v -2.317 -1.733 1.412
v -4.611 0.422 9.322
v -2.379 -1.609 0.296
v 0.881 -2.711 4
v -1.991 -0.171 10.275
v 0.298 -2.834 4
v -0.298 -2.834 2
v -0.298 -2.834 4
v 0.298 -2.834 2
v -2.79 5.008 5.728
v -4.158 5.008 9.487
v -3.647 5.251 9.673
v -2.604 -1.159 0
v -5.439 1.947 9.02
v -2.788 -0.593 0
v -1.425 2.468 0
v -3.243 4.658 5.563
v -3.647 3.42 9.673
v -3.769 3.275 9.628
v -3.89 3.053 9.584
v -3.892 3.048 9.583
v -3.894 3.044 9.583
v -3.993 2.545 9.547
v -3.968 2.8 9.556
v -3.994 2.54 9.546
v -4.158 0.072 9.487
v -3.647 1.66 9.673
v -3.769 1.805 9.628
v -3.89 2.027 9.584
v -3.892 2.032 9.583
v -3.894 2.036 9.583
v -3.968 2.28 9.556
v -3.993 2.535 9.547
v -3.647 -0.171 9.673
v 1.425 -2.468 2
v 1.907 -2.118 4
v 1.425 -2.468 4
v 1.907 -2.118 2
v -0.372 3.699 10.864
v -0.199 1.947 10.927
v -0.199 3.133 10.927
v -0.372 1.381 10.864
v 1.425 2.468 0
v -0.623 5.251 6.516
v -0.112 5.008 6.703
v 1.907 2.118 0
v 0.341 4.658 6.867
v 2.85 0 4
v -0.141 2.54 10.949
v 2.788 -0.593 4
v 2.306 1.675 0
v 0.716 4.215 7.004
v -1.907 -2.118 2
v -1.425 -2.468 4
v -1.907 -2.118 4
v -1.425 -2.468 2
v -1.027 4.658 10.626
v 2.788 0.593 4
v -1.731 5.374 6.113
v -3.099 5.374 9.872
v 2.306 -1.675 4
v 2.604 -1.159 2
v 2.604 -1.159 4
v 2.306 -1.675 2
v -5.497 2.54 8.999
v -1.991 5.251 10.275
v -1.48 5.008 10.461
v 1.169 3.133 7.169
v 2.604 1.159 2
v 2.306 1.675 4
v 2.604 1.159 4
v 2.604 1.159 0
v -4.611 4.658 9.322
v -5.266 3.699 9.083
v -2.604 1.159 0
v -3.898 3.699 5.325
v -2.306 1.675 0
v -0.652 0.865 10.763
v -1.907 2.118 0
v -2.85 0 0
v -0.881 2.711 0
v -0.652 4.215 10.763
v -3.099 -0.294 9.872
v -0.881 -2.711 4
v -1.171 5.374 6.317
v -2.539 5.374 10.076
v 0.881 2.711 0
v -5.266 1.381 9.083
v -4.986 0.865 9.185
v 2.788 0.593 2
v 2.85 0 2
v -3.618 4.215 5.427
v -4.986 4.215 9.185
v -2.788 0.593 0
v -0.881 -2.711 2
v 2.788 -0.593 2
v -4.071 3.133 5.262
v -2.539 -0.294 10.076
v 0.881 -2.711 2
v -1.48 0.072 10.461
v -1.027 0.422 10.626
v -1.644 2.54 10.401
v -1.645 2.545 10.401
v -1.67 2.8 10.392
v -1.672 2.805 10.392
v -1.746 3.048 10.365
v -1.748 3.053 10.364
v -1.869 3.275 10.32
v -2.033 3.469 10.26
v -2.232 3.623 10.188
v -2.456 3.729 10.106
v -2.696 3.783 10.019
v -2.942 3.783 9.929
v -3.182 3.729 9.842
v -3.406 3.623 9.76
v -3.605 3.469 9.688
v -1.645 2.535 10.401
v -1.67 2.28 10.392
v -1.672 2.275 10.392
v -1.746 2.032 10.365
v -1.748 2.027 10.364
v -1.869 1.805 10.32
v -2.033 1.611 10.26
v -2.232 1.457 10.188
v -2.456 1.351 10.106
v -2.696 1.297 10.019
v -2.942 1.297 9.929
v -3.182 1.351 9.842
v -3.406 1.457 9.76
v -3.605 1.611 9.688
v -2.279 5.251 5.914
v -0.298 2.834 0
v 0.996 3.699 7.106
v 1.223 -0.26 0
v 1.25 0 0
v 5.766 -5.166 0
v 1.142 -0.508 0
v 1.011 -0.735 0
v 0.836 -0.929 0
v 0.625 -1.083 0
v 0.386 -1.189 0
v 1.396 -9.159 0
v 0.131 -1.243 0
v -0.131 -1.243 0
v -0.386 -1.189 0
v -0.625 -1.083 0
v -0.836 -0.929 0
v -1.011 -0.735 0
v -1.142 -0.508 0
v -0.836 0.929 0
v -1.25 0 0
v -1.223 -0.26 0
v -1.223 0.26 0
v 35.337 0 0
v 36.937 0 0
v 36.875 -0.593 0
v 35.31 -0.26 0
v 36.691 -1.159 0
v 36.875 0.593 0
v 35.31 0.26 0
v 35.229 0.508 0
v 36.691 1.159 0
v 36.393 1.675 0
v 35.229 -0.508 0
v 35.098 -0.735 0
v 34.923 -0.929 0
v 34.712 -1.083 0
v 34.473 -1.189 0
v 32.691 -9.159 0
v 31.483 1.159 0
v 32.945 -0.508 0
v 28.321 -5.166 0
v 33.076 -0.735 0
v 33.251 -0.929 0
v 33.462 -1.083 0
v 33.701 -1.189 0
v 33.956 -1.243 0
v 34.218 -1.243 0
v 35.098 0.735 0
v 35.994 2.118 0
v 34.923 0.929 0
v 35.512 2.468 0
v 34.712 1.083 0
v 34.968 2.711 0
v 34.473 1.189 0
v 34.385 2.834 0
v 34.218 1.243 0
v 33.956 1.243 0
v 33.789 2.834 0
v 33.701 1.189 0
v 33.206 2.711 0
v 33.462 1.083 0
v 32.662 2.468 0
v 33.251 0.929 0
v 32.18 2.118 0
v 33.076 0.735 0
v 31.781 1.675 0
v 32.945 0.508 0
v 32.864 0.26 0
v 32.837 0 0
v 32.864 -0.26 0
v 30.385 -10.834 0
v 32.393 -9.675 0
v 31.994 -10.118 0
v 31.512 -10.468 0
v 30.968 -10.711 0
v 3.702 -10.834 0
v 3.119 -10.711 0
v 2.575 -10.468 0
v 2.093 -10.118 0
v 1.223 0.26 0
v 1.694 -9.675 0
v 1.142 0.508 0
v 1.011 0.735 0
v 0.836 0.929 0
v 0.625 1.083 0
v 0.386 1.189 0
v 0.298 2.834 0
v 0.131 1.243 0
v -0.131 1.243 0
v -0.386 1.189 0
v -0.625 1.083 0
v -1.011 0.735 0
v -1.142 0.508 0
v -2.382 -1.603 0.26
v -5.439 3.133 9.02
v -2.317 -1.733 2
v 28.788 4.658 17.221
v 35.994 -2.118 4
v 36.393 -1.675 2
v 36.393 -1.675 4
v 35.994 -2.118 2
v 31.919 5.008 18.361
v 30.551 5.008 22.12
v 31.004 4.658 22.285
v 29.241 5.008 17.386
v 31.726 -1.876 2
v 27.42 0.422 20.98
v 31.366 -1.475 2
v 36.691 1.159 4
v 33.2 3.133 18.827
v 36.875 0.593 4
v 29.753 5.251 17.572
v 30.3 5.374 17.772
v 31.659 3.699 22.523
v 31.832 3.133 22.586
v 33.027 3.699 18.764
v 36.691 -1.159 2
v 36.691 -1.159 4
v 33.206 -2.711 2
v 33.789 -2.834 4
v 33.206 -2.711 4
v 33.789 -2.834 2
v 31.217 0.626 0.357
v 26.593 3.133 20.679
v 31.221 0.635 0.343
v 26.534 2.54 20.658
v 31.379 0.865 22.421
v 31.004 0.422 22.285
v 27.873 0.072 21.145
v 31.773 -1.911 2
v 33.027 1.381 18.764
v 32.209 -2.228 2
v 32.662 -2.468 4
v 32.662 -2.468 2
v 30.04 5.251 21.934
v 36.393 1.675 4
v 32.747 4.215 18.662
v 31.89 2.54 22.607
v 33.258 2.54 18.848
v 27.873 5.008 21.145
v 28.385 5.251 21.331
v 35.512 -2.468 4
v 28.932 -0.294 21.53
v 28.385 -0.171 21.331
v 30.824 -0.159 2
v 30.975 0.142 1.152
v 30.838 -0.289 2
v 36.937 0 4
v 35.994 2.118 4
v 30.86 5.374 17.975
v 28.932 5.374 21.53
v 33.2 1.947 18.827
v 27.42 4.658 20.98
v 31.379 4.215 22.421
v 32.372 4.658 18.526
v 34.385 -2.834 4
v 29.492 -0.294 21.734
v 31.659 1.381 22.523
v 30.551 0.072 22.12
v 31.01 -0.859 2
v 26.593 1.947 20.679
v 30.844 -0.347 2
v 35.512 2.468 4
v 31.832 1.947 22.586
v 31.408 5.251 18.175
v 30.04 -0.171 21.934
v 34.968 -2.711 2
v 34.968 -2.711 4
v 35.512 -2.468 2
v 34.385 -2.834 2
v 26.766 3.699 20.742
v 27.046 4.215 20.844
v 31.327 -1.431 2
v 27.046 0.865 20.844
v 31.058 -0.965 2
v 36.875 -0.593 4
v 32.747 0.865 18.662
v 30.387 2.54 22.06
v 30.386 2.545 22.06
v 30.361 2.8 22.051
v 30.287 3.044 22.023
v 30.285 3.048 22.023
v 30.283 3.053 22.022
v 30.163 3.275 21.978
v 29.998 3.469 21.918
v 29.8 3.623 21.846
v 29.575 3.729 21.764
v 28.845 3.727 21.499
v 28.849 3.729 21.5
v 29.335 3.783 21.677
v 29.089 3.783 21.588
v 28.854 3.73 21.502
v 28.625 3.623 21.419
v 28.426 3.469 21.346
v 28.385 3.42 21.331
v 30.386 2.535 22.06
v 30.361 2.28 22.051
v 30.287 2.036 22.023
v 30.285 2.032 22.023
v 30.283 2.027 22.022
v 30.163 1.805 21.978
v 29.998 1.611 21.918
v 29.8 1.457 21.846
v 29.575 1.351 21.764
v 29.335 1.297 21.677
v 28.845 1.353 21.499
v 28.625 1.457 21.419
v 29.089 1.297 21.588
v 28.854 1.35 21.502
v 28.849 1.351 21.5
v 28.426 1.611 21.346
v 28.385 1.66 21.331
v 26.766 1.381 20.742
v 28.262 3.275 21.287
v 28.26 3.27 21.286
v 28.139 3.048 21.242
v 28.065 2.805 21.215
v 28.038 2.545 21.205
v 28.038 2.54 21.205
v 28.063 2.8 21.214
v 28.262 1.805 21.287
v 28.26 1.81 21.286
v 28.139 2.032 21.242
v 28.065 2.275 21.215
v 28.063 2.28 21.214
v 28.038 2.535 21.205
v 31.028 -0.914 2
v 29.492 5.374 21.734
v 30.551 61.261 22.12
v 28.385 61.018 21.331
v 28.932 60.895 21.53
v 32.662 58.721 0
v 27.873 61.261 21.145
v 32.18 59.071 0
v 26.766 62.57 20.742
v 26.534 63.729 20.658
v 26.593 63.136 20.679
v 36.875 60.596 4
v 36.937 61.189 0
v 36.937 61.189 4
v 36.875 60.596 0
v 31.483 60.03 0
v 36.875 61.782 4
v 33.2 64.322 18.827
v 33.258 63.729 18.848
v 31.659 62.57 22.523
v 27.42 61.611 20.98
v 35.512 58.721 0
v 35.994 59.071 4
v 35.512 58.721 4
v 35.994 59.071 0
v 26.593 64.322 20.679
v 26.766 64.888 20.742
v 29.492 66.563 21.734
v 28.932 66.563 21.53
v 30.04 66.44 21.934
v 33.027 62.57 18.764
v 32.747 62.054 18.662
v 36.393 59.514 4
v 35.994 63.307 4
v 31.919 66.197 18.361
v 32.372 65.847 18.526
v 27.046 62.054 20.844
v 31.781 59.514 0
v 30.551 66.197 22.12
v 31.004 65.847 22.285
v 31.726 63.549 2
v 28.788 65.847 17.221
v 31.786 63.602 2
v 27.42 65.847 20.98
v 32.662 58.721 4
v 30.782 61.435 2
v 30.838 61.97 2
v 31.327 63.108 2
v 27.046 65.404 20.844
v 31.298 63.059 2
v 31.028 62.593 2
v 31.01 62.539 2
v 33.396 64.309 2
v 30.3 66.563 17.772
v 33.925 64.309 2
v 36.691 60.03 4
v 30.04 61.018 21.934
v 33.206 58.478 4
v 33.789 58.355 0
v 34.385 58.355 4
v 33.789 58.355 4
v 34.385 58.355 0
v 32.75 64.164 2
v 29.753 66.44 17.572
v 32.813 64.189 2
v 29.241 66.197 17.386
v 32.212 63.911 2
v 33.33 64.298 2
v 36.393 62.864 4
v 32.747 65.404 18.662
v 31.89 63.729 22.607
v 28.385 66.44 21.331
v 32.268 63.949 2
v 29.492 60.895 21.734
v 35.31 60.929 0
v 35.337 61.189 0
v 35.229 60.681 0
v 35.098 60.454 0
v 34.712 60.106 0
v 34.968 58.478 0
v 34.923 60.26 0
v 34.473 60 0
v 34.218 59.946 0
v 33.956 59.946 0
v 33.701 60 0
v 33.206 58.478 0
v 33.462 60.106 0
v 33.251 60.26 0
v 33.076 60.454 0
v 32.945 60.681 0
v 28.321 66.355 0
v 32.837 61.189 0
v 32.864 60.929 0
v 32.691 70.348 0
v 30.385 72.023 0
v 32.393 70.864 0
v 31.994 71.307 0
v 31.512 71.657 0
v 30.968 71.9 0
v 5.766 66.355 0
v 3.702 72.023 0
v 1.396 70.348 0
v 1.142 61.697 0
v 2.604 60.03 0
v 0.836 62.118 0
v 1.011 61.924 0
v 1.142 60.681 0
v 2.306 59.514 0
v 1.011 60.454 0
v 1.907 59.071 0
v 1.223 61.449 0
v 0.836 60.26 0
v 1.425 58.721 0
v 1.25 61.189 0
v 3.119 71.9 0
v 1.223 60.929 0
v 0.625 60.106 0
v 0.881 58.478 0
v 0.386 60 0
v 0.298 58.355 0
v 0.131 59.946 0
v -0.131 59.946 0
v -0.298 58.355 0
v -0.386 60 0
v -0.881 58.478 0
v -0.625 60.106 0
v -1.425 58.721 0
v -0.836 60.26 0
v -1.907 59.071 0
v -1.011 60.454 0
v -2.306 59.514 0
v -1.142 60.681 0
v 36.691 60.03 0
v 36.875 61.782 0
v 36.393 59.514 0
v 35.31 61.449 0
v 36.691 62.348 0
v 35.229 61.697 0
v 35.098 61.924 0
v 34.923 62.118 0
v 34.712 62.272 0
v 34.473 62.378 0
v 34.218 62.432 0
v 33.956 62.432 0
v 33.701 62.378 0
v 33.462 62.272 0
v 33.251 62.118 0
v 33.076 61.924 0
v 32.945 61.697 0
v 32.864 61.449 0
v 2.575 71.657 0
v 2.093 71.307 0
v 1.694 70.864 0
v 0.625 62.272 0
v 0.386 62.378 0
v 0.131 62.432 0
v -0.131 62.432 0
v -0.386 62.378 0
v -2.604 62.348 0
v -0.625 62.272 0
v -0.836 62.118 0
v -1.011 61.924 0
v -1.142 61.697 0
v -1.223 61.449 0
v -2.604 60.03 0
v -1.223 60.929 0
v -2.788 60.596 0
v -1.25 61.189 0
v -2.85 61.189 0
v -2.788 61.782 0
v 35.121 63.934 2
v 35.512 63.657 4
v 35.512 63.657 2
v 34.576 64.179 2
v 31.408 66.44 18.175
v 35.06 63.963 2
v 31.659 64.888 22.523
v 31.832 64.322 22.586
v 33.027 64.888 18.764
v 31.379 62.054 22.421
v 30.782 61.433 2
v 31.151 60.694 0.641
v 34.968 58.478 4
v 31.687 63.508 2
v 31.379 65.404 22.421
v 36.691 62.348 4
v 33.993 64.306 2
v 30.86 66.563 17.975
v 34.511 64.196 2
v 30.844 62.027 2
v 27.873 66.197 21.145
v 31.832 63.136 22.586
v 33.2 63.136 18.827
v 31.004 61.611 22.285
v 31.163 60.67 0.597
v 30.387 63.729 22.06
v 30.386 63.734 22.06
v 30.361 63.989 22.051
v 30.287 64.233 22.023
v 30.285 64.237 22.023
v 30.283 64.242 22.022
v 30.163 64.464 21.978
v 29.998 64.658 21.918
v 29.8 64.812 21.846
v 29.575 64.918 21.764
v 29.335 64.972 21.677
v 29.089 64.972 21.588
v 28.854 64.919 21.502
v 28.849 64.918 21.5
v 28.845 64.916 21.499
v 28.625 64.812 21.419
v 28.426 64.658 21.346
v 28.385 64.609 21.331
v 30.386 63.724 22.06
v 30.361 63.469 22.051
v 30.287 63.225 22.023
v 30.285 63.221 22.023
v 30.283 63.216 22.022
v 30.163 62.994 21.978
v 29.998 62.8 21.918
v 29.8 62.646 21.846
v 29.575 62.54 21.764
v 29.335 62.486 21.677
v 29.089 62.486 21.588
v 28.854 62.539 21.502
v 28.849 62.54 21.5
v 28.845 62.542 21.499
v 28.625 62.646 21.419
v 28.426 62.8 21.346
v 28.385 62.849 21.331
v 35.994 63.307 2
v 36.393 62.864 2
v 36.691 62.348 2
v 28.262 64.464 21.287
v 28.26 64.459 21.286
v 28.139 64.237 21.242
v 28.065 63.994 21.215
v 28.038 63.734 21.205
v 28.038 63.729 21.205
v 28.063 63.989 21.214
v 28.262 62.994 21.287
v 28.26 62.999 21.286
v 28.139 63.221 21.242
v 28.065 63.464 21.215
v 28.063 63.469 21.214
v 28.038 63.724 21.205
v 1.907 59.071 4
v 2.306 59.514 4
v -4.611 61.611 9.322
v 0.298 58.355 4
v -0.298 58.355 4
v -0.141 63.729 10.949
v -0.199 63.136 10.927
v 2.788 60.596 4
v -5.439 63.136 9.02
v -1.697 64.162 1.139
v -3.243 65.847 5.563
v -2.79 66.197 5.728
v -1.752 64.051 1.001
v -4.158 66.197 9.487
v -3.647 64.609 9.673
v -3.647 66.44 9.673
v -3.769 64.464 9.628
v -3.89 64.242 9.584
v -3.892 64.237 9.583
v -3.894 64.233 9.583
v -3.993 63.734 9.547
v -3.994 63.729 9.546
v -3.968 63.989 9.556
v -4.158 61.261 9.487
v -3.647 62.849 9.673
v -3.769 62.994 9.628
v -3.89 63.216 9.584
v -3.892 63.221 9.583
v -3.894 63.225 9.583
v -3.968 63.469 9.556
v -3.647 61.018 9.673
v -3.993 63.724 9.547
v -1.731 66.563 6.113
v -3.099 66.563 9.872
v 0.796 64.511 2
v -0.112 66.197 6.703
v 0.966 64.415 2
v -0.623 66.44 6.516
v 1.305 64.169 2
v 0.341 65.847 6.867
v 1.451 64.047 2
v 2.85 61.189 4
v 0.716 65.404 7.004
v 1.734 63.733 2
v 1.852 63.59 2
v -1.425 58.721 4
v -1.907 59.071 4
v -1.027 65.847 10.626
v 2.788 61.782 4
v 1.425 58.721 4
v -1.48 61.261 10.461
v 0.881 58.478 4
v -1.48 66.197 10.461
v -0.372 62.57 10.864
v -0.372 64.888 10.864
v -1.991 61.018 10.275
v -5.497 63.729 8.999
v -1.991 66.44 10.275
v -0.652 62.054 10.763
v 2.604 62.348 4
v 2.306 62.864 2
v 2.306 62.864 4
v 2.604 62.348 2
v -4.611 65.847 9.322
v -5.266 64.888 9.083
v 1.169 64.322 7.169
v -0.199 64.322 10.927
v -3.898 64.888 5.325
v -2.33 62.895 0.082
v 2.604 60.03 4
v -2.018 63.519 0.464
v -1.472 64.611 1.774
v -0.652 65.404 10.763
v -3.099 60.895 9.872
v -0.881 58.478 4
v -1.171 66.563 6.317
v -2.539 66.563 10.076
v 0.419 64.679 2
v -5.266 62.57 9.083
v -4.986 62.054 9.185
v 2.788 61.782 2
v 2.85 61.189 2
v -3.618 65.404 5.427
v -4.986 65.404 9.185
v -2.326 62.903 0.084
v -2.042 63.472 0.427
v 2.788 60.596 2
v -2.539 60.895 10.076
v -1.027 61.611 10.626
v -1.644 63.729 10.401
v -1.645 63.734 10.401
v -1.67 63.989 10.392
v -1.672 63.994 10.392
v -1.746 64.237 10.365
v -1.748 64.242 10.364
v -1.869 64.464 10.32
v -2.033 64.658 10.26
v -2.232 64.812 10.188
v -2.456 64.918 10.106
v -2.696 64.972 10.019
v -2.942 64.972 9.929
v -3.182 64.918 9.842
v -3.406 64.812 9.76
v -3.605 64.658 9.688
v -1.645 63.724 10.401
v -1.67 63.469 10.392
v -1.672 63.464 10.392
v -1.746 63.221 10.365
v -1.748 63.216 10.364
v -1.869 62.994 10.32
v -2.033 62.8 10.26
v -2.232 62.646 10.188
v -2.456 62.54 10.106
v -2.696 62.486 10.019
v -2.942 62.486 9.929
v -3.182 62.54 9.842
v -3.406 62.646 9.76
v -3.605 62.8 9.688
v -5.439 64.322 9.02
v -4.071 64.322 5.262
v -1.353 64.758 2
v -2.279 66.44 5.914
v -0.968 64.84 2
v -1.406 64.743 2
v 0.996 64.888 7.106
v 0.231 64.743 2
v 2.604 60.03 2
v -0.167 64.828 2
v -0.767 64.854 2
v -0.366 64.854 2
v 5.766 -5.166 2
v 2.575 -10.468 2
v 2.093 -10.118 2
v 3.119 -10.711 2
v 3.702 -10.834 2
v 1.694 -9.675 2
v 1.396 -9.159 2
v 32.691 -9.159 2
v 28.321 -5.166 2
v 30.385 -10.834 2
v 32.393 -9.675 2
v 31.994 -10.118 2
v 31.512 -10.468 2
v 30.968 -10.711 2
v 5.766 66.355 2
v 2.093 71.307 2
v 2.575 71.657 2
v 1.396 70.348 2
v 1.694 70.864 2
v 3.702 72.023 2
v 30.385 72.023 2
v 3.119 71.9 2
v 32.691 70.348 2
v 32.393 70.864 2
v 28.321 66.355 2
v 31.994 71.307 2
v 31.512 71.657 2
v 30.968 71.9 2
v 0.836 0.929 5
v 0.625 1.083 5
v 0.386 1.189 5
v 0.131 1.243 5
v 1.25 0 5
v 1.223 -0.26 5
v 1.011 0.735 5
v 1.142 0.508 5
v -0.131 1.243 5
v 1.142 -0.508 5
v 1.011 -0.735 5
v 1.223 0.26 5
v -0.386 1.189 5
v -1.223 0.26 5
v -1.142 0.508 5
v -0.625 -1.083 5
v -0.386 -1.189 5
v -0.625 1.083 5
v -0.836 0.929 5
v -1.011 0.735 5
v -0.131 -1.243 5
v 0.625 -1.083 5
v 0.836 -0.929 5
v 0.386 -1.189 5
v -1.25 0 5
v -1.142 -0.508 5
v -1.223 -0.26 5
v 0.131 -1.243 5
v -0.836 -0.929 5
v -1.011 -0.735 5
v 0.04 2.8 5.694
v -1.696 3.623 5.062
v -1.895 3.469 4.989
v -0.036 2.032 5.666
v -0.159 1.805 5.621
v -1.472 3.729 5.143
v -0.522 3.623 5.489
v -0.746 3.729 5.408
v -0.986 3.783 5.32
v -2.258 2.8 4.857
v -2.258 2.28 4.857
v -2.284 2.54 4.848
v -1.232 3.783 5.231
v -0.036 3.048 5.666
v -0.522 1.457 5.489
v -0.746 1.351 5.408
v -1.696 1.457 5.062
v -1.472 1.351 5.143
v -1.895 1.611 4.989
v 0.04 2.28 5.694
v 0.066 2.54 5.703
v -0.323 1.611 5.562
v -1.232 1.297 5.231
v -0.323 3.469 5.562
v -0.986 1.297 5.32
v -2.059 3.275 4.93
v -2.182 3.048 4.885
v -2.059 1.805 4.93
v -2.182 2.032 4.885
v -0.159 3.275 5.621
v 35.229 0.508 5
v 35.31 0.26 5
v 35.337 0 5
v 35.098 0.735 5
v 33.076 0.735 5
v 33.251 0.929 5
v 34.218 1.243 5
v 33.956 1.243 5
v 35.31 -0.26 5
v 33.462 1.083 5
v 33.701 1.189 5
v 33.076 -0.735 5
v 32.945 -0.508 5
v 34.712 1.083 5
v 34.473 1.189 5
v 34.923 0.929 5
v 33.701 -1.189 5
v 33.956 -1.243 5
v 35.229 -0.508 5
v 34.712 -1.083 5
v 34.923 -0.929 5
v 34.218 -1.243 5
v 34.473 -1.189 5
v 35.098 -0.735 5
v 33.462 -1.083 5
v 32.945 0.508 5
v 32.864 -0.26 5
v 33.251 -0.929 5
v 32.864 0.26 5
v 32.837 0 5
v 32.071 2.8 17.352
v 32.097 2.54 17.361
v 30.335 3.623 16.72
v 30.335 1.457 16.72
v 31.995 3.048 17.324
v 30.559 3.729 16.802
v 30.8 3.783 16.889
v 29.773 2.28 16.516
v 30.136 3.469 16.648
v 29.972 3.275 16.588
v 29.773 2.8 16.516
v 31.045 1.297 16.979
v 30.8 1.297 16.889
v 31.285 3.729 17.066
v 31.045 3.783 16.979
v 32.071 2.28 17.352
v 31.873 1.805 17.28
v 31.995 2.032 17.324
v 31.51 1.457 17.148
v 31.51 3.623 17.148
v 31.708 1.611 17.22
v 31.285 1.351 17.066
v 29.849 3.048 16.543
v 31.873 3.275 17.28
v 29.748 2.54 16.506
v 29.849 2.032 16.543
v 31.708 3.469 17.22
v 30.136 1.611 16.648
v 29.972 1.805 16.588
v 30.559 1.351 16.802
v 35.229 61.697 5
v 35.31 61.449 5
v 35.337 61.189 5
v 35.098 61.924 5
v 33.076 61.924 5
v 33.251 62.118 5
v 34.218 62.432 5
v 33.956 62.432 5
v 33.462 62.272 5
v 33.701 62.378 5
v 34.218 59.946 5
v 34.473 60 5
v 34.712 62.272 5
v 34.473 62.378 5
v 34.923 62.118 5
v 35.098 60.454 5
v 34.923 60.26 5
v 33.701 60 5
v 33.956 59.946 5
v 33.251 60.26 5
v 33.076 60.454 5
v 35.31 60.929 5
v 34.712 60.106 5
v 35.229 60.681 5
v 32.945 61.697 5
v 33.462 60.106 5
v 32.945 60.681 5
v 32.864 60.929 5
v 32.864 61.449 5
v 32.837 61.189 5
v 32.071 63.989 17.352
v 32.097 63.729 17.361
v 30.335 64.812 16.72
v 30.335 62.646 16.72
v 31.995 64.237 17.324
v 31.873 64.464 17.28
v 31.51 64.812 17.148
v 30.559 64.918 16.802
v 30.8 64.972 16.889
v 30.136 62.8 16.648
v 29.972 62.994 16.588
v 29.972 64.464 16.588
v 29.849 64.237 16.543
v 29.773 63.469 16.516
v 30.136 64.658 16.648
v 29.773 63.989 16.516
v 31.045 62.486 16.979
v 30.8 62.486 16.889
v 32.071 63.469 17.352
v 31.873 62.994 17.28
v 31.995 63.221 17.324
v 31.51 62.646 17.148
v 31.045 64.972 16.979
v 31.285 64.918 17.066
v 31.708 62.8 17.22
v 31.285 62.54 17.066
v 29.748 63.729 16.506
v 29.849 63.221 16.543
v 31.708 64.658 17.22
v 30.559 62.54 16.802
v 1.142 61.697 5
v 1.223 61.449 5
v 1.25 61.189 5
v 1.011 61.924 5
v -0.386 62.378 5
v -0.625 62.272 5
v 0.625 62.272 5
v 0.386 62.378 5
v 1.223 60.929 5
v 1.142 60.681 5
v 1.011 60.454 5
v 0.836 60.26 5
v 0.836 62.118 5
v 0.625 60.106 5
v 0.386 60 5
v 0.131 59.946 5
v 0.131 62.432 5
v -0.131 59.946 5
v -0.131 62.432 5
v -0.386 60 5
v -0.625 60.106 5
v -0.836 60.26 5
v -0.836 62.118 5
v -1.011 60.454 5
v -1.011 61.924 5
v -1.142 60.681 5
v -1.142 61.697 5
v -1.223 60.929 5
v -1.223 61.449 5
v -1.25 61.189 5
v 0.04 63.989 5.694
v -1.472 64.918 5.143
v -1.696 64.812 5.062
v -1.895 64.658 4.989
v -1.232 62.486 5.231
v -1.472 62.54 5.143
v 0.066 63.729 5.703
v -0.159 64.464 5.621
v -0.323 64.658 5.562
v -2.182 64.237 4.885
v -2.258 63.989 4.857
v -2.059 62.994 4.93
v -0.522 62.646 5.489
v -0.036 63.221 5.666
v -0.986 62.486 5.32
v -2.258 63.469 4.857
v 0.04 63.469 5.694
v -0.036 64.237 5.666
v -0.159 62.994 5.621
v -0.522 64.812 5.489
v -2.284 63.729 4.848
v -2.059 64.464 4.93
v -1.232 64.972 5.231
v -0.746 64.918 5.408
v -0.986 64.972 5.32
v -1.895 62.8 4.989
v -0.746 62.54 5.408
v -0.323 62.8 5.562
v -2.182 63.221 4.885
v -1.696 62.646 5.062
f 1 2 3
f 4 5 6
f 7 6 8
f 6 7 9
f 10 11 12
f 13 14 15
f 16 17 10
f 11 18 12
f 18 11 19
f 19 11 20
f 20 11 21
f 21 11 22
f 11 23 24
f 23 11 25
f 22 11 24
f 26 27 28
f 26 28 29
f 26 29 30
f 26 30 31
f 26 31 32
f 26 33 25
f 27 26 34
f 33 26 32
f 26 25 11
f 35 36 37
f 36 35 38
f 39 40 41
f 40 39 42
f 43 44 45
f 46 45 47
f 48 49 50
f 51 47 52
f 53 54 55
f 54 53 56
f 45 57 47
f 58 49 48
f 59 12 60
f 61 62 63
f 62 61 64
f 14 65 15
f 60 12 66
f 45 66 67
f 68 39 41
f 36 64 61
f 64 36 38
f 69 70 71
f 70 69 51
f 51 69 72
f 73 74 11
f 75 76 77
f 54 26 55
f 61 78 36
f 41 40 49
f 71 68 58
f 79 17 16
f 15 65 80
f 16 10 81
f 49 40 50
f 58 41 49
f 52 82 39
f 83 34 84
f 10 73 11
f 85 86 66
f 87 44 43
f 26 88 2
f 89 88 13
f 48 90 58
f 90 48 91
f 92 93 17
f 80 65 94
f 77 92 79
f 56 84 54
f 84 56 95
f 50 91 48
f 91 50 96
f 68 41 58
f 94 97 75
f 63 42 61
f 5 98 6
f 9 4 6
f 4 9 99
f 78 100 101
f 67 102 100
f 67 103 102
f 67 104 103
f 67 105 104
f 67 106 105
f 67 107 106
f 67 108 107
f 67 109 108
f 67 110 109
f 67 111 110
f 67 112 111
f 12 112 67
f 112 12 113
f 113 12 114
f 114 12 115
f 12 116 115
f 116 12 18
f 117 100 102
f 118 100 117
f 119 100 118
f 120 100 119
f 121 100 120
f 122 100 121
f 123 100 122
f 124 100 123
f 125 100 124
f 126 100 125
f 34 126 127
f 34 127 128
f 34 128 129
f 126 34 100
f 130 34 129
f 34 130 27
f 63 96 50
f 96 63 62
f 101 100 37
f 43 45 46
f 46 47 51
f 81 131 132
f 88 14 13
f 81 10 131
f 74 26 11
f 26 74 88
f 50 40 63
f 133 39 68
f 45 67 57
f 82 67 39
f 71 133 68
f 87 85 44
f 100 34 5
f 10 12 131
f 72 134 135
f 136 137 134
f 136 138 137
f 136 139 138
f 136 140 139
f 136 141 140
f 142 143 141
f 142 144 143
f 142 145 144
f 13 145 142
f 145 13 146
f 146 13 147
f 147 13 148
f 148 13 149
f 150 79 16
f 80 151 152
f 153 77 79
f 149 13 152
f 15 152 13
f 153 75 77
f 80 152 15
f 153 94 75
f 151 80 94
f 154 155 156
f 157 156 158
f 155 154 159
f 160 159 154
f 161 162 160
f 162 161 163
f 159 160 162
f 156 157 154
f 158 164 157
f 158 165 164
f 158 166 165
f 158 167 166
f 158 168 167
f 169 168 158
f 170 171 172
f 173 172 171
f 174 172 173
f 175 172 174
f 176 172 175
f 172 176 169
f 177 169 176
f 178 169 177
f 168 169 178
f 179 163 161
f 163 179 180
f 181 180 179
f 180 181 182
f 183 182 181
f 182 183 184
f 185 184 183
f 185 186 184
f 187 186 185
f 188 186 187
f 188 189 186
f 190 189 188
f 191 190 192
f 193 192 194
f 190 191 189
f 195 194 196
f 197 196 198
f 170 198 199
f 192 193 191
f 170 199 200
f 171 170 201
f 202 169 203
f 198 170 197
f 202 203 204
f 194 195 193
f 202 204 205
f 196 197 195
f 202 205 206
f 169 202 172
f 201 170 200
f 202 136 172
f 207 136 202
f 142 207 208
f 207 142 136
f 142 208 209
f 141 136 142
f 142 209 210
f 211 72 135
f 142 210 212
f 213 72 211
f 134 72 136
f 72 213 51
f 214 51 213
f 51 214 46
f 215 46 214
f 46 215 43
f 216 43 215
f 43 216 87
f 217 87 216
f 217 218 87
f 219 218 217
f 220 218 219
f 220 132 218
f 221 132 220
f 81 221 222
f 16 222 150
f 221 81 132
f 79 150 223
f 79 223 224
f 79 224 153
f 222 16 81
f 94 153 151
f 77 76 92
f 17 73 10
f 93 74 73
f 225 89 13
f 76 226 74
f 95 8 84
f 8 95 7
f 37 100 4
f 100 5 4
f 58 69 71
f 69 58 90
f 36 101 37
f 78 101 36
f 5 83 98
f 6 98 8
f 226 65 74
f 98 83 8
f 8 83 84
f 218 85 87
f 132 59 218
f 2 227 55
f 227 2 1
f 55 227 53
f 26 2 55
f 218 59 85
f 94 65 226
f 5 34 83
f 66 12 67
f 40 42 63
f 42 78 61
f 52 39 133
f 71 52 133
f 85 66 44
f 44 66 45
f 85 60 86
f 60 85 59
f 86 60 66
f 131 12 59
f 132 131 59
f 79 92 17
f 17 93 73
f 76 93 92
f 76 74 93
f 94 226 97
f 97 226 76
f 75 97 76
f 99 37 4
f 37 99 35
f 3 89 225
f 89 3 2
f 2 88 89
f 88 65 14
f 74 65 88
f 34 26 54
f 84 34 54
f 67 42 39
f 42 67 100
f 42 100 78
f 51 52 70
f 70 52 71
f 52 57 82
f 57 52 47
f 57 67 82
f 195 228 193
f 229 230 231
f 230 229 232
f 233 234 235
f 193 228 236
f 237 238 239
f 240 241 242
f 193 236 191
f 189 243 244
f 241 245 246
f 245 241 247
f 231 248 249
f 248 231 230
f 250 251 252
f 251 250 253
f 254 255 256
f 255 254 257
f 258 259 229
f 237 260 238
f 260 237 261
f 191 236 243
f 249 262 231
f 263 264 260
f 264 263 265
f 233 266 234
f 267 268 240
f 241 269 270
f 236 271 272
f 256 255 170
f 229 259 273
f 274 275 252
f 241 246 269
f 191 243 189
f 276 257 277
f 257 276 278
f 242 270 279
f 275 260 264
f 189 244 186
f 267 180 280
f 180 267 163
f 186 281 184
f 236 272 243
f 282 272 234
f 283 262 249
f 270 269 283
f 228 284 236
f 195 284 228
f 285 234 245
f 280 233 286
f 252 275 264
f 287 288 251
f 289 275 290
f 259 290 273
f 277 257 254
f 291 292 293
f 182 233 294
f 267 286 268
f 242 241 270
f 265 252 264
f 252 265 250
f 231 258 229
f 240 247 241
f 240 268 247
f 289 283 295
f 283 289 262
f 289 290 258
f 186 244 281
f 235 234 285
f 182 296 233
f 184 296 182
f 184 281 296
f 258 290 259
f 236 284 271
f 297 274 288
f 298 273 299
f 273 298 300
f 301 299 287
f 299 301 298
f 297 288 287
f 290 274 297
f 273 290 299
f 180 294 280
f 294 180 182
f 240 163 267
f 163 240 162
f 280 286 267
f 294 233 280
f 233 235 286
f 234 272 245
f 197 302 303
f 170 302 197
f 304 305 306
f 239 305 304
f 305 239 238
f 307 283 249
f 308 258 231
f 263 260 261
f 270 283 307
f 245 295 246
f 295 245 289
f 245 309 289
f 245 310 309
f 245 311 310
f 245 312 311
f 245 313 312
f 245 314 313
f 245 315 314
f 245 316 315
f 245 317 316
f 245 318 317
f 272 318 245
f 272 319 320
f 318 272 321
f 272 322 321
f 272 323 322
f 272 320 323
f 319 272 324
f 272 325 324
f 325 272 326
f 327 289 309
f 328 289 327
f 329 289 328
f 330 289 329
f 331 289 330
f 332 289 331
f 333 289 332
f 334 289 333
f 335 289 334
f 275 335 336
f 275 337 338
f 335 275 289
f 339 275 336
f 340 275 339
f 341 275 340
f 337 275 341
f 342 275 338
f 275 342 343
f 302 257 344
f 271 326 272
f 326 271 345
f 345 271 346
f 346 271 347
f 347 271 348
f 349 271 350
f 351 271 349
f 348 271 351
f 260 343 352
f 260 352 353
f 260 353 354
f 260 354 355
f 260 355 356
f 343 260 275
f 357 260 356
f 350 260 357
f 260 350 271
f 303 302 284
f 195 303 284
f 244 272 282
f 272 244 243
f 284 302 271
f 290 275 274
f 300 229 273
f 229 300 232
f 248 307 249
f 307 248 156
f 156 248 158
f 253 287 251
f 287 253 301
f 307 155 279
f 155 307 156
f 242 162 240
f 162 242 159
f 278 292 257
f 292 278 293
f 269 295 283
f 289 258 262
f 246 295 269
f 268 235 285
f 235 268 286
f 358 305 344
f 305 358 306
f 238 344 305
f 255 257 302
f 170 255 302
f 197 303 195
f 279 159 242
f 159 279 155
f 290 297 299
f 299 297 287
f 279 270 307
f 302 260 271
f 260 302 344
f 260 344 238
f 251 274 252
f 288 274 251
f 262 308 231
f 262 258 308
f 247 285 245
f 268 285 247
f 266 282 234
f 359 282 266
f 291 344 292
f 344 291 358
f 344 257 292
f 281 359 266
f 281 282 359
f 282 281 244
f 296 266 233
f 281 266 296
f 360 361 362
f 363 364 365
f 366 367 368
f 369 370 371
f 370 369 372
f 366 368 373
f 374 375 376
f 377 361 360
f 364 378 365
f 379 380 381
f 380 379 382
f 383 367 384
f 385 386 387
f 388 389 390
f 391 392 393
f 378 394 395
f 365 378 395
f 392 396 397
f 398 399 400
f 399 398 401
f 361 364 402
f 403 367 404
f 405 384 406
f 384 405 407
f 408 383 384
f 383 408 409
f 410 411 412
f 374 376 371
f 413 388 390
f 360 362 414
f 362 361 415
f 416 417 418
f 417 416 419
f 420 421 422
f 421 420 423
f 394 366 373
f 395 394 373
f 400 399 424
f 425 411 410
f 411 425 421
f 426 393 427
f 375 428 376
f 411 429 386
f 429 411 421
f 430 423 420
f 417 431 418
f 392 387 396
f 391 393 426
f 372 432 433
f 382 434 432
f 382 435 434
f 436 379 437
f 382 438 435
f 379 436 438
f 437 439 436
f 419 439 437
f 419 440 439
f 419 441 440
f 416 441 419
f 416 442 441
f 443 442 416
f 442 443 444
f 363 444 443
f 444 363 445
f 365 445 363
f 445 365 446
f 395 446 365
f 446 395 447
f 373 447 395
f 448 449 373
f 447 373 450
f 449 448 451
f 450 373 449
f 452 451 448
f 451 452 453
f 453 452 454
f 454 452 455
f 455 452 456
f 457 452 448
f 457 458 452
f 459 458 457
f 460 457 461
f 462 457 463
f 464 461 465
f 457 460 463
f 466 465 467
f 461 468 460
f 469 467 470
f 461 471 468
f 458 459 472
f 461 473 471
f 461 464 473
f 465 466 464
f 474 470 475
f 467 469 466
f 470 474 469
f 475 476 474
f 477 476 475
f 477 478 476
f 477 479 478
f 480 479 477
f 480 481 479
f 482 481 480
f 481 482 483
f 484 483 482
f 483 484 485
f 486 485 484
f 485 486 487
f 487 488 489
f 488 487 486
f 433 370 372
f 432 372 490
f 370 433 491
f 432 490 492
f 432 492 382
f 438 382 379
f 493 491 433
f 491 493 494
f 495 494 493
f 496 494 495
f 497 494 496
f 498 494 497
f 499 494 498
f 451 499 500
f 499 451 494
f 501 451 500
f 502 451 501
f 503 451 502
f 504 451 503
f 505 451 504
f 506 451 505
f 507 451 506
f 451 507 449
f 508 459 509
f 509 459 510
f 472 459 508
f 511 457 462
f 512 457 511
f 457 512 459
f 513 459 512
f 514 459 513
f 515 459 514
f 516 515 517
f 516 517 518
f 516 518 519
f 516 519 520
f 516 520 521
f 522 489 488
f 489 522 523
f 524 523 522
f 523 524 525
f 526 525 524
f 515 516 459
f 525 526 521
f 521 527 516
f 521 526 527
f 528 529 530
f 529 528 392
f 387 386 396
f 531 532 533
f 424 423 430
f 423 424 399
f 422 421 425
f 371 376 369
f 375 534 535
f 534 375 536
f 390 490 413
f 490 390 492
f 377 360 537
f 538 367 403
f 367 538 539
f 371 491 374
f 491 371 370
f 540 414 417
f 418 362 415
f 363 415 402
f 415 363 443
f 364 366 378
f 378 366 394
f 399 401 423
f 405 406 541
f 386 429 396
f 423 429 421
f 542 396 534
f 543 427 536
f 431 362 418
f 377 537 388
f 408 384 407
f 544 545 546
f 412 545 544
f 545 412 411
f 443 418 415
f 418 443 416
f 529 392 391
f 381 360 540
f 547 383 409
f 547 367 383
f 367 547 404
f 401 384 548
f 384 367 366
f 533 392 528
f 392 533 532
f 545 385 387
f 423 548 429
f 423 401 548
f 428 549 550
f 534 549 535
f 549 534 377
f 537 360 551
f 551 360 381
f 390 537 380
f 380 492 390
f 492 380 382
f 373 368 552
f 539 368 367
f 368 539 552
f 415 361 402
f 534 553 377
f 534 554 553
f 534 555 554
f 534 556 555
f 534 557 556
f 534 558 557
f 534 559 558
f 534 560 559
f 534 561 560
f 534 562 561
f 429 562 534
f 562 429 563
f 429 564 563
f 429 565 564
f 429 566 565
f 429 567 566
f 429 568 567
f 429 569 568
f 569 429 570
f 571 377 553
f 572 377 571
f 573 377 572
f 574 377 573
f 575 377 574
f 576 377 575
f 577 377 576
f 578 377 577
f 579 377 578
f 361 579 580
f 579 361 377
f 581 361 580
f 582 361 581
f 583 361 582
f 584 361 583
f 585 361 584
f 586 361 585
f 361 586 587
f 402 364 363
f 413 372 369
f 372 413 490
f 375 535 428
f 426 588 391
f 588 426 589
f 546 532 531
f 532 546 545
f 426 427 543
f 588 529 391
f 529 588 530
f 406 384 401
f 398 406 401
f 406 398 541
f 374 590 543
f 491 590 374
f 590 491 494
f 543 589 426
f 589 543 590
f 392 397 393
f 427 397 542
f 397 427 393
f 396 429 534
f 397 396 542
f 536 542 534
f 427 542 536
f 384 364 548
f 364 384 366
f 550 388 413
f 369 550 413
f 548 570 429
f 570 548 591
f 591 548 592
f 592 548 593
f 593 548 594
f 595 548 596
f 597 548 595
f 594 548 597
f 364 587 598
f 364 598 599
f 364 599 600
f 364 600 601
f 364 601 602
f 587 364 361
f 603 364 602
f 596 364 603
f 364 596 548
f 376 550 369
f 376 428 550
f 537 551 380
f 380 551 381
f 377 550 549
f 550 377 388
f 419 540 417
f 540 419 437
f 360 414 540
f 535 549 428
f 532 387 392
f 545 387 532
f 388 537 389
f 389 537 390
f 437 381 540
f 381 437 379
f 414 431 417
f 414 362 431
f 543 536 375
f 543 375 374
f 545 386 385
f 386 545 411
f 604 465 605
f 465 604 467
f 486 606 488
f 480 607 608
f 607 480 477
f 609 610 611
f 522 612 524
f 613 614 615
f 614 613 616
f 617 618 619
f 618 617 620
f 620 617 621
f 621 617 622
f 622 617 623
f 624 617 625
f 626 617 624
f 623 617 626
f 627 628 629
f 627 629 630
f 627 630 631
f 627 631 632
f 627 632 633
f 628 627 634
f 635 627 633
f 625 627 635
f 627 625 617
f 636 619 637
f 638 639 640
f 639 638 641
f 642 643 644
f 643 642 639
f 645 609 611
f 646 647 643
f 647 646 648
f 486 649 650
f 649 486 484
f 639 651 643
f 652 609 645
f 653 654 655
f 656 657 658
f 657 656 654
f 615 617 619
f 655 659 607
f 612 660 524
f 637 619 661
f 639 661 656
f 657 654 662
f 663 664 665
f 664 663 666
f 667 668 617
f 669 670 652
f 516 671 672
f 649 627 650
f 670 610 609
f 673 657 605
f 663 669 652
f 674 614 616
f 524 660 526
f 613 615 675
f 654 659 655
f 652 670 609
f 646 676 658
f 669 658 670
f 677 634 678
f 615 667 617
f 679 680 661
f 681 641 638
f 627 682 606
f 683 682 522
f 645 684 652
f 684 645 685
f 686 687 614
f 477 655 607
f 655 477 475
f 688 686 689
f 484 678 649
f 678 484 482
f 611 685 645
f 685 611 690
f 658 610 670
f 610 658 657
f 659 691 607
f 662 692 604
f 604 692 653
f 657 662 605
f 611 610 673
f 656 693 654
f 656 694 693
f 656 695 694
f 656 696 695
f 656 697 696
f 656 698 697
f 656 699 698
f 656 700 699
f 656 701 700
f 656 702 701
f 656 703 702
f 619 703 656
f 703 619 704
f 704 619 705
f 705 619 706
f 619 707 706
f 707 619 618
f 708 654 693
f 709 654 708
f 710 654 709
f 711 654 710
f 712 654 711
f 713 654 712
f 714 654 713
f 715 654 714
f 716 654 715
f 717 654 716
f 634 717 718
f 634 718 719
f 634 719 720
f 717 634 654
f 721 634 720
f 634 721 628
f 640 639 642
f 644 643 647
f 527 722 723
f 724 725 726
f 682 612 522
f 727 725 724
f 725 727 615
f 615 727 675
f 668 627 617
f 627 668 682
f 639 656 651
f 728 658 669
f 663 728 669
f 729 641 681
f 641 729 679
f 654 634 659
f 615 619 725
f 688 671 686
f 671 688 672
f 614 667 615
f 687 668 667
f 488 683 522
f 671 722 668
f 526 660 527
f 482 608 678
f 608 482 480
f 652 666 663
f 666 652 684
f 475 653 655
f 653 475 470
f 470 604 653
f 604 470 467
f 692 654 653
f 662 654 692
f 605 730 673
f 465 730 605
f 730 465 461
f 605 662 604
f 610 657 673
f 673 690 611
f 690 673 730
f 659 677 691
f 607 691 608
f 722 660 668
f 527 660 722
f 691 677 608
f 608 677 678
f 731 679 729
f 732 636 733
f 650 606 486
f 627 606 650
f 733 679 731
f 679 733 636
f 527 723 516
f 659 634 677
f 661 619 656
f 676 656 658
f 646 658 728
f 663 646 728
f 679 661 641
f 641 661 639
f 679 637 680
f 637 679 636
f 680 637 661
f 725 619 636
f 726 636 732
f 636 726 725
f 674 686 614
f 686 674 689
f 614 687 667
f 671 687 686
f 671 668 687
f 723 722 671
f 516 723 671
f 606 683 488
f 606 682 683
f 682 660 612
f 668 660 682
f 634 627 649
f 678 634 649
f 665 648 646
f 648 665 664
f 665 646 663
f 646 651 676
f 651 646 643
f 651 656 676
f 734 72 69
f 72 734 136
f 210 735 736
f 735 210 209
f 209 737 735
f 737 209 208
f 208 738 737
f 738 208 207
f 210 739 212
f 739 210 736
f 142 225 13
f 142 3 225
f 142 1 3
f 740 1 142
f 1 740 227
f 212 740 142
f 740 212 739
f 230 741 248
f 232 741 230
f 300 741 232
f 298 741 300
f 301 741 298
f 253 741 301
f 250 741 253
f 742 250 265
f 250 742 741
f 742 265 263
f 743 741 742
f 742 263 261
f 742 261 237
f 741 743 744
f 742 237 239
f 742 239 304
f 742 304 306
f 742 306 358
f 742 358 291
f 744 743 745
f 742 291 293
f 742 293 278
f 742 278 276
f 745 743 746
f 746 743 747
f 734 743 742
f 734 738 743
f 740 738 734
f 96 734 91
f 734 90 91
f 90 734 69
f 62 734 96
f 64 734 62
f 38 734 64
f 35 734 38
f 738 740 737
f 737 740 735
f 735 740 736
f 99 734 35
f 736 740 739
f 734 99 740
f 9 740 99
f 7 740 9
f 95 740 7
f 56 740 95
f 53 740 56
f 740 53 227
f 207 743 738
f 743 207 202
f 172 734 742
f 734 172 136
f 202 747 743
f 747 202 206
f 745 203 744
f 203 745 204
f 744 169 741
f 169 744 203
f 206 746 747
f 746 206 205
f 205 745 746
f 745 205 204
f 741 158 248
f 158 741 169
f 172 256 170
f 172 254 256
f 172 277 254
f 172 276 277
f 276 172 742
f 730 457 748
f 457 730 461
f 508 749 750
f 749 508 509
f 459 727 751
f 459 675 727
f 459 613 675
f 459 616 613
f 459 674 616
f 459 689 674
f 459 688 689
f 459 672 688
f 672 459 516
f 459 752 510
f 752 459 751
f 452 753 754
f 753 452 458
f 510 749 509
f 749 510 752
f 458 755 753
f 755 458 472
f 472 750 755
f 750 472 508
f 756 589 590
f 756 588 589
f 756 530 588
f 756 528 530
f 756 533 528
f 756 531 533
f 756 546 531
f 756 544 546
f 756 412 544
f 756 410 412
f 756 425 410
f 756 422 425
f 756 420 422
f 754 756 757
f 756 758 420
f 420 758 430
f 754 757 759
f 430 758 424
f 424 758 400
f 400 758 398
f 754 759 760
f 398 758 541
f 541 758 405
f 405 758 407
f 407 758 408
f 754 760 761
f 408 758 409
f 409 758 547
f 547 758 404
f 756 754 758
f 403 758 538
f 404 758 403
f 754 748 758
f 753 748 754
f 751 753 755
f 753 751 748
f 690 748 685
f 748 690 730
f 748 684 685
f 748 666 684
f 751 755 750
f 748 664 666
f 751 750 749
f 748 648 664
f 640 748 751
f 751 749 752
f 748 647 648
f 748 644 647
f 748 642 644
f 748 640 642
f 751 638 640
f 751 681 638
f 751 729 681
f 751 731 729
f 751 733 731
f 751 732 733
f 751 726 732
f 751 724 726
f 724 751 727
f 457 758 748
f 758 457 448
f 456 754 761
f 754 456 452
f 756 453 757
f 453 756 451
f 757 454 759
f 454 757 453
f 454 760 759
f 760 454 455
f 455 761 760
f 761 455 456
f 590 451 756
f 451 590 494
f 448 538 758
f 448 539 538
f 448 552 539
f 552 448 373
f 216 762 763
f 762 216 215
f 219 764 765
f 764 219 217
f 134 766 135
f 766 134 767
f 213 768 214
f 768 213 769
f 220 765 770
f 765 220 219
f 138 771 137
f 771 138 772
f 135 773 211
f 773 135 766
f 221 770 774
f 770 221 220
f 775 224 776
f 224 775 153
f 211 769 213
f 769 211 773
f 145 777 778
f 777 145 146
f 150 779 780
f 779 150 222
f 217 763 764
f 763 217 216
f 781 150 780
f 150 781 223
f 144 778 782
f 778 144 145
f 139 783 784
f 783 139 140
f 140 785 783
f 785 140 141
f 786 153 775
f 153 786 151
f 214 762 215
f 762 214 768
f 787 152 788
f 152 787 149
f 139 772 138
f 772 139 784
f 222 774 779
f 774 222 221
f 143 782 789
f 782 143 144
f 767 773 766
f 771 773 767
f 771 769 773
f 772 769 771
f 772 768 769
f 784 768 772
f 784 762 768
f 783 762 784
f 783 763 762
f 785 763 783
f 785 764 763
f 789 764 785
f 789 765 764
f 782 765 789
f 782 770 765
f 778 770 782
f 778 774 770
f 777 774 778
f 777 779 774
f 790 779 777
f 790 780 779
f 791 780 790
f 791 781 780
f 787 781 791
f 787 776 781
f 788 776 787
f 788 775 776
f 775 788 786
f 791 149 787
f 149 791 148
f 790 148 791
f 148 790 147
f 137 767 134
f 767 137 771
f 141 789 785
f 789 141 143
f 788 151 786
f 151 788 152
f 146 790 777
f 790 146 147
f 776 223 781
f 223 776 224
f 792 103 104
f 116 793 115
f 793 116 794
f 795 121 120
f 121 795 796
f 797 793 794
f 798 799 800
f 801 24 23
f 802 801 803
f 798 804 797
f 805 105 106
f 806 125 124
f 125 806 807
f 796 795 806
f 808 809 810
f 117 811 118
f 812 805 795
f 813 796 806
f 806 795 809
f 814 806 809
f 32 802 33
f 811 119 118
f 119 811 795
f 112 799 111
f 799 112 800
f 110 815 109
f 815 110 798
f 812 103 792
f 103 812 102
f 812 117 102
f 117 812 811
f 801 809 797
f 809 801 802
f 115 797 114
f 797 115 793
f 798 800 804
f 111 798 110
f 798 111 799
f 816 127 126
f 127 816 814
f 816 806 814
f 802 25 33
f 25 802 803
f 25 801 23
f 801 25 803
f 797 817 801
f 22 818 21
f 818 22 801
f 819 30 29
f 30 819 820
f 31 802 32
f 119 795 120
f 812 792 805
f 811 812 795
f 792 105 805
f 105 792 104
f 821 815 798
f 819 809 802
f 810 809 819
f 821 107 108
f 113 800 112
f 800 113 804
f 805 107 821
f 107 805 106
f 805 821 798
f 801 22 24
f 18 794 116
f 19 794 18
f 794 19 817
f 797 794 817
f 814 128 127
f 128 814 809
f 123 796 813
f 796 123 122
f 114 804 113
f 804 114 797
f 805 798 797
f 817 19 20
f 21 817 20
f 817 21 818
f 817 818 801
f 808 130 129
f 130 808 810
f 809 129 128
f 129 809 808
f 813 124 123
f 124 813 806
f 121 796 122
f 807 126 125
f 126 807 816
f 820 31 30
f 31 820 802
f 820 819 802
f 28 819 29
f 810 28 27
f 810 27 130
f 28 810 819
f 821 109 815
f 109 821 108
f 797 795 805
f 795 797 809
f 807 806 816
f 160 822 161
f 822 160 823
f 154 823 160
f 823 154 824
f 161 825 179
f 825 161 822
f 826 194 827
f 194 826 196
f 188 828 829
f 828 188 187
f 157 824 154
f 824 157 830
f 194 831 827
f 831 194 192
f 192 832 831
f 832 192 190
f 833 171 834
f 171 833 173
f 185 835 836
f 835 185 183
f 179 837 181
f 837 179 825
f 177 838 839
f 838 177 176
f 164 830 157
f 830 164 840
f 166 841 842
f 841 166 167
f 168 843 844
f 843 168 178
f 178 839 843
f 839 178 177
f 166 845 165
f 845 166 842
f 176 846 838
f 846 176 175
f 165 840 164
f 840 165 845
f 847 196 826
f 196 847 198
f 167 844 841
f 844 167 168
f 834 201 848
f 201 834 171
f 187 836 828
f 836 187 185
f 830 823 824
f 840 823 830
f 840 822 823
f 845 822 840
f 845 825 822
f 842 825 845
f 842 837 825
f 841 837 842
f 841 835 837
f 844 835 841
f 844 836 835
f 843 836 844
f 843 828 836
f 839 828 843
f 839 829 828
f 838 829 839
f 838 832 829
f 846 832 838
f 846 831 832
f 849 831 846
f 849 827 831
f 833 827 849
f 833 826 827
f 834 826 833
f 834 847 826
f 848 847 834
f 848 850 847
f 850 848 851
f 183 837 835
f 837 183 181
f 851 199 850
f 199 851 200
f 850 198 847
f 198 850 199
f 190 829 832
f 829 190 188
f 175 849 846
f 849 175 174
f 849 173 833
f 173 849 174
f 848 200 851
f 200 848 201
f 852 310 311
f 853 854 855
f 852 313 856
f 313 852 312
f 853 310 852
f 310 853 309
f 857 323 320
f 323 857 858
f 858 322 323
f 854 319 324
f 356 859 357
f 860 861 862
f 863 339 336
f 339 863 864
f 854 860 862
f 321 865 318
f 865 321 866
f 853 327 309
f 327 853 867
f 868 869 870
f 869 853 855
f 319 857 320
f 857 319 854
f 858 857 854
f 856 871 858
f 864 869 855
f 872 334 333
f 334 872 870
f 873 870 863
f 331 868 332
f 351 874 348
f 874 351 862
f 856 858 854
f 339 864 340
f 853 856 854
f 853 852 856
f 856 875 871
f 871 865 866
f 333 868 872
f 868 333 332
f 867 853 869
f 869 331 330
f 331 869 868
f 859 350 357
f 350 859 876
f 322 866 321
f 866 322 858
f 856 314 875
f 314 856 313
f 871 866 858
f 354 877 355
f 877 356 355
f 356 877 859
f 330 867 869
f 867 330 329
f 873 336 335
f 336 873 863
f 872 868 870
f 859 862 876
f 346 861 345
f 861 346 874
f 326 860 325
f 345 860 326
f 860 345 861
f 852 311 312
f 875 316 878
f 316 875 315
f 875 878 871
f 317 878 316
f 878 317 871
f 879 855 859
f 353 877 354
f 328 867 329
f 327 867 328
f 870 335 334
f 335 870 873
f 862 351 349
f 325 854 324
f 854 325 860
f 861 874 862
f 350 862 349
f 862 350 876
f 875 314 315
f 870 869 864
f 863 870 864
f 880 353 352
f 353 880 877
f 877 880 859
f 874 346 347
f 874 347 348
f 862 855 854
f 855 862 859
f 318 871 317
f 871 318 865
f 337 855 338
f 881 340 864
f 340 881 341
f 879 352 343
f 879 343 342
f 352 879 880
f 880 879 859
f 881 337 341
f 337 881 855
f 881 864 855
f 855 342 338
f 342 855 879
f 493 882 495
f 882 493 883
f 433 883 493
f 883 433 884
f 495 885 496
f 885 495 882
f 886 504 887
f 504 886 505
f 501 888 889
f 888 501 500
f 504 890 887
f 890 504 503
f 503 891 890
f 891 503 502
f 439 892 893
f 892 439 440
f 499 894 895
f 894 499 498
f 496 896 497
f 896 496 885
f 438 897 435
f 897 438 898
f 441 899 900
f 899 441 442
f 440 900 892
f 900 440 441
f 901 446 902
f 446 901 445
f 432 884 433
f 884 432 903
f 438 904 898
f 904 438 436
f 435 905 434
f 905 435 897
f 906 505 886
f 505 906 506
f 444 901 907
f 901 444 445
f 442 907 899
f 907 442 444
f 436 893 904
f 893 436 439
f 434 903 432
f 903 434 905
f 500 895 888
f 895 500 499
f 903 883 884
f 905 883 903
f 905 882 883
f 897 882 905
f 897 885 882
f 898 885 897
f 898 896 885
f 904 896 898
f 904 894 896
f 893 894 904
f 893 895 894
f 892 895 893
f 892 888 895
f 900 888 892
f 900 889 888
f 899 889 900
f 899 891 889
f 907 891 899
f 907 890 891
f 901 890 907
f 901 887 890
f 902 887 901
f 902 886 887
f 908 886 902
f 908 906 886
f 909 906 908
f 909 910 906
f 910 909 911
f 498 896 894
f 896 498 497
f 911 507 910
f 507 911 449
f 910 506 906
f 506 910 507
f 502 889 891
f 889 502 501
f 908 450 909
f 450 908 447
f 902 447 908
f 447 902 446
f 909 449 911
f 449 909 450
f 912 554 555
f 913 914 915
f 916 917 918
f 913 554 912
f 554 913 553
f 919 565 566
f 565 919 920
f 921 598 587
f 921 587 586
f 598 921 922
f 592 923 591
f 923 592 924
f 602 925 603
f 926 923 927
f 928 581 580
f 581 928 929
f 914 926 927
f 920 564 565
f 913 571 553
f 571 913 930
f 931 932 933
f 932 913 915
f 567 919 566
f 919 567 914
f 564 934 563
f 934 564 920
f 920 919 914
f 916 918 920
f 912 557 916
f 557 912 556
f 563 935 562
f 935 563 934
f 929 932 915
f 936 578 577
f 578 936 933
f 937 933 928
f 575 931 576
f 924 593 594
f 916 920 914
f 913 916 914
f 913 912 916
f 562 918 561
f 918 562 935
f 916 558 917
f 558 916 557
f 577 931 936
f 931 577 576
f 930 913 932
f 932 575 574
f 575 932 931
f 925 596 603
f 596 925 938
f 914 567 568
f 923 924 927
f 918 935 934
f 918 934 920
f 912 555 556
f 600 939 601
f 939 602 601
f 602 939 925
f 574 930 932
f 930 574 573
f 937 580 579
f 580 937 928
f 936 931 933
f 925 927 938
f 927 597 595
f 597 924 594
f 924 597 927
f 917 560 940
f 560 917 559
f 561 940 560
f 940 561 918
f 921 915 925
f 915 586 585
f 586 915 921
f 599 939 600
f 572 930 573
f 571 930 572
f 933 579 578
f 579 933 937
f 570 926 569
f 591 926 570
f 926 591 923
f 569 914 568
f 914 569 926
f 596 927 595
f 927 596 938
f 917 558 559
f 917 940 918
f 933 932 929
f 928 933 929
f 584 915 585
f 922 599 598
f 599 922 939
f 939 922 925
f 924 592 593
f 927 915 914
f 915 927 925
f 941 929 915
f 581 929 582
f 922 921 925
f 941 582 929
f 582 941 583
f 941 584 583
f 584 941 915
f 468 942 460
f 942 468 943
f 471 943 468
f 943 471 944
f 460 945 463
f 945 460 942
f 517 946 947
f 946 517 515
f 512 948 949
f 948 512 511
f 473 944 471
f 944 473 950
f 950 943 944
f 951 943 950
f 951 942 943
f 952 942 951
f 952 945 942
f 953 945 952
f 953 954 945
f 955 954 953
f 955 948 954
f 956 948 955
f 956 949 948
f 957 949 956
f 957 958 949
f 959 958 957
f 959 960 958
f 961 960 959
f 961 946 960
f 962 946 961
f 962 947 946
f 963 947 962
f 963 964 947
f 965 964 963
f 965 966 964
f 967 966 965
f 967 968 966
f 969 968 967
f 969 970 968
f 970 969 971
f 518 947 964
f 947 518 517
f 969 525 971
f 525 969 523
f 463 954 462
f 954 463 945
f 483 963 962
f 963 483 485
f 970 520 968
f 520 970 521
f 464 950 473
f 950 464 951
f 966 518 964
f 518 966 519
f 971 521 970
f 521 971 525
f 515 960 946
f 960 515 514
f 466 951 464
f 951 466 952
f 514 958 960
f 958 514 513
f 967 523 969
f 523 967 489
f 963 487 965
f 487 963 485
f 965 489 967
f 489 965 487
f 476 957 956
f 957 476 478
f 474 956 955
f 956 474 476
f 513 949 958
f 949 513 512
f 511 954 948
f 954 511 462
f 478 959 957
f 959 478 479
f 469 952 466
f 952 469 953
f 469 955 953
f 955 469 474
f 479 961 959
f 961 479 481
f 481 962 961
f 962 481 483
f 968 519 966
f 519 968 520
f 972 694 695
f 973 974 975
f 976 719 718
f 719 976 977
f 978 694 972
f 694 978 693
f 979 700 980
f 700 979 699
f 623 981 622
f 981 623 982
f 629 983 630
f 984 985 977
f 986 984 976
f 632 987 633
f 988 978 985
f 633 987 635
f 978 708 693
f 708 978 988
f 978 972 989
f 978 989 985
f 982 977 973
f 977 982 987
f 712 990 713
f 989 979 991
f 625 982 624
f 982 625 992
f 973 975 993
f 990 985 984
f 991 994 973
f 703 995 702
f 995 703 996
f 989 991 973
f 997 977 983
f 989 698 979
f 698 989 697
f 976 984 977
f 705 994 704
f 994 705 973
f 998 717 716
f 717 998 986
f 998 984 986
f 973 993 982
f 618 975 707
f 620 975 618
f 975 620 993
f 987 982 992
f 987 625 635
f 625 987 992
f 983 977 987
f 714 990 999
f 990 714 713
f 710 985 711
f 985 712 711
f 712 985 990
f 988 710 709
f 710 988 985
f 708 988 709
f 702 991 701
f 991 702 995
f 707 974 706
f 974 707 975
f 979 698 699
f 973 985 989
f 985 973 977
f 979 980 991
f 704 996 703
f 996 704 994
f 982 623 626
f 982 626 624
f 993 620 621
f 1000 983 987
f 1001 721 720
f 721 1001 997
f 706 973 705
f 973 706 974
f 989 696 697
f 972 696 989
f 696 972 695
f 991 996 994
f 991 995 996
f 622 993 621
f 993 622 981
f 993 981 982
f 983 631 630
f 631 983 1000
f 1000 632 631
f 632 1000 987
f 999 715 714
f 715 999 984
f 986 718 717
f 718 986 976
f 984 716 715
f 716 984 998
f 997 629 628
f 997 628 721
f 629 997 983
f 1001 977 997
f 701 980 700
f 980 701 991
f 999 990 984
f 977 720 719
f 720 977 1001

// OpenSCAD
$fs = 0.05;
thickness = 2;

screw_diam = 2.5;
screw_drill = 2.5;
screw_clearance = 3.4;
screw_wall_thickness = 1.6;  // must be a multiple of nozzle size 0.4

dispW = 34.087;
dispL = 61.189;
disp_mount = [
  [0, 0],
  [dispW, 0],
  [dispW, dispL],
  [0, dispL]
];

disp_angle = 20;
disp_rise = 11;  // standoff height for header is 11mm
disp_fall = 3;  // amount to slide "down" at the angle
disp_offset = 2.54;  // amount to slide left

module mountpoint(x, y) {
  translate([x, y, -2]) cylinder(d=screw_diam-0.2, h=2);
}

module MountRef() {
  for (m = disp_mount) {
    mountpoint(m[0], m[1]);
  }
}

module flatcapsule(p0, p1, r) {
  linear_extrude(height=thickness) {
    hull() {
      translate(p0) circle(r=r);
      translate(p1) circle(r=r);
    }
  }
}

module OffsetMount(p0, p1, r) {
  difference() {
    flatcapsule(p0, p1, r);
    translate([p0[0], p0[1], -0.1]) cylinder(d=screw_clearance, h=thickness+0.2);
  }
}

module anglebeamorig(p0, p1, r) {
  difference() {
    hull() {
      translate(p0) sphere(r=r);
      translate([0, 0, disp_rise]) rotate([0, -disp_angle, 0]) translate([-disp_fall, disp_offset, 0]) translate(p1) sphere(r=r);
    }
    translate(p0) translate([0, 0, -r-0.1]) cylinder(h=r+0.1, r=r+0.1);
    translate([0, 0, disp_rise]) rotate([0, -disp_angle, 0]) translate([-disp_fall, disp_offset, 0]) translate(p1) cylinder(h=r+0.1, r=10);
  }
}

module anglebeam(p0, p1, r) {
  hull() {
    translate(p0) cylinder(h=4, r=r);
    translate([0, 0, disp_rise]) rotate([0, -disp_angle, 0]) translate([-disp_fall, disp_offset, -4]) translate(p1) cylinder(h=4, r=r);
  }
}

module Riser() {
  oy = 8;
  ox = 4;
  r = screw_wall_thickness + screw_drill/2;

  difference() {
    union() {
      flatcapsule([0, 0], [ox, -oy], r);
      flatcapsule([ox, -oy], [dispW-ox, -oy], r);
      flatcapsule([dispW-ox, -oy], [dispW, 0], r);

      flatcapsule([0, dispL], [ox, dispL+oy], r);
      flatcapsule([ox, dispL+oy], [dispW-ox, dispL+oy], r);
      flatcapsule([dispW-ox, dispL+oy], [dispW, dispL], r);
      for (m = disp_mount) {
        anglebeam(m, m, r);
      }
    }
    for (m = disp_mount) {
      translate([m[0], m[1], -0.1]) cylinder(h=5.1, d=screw_drill);
      translate([0, 0, disp_rise]) rotate([0, -disp_angle, 0])
        translate([-disp_fall, disp_offset, -5]) translate(m)
        cylinder(h=5.1, d=screw_drill);
    }
  }
}

%MountRef();
translate([17.043, -0.864, 11.0/2]) %cube([20.32+2.54, 2.54, 11], center=true);
translate([0, 0, disp_rise]) rotate([0, -disp_angle, 0]) translate([-disp_fall, disp_offset, 0]) %MountRef();

Riser();
